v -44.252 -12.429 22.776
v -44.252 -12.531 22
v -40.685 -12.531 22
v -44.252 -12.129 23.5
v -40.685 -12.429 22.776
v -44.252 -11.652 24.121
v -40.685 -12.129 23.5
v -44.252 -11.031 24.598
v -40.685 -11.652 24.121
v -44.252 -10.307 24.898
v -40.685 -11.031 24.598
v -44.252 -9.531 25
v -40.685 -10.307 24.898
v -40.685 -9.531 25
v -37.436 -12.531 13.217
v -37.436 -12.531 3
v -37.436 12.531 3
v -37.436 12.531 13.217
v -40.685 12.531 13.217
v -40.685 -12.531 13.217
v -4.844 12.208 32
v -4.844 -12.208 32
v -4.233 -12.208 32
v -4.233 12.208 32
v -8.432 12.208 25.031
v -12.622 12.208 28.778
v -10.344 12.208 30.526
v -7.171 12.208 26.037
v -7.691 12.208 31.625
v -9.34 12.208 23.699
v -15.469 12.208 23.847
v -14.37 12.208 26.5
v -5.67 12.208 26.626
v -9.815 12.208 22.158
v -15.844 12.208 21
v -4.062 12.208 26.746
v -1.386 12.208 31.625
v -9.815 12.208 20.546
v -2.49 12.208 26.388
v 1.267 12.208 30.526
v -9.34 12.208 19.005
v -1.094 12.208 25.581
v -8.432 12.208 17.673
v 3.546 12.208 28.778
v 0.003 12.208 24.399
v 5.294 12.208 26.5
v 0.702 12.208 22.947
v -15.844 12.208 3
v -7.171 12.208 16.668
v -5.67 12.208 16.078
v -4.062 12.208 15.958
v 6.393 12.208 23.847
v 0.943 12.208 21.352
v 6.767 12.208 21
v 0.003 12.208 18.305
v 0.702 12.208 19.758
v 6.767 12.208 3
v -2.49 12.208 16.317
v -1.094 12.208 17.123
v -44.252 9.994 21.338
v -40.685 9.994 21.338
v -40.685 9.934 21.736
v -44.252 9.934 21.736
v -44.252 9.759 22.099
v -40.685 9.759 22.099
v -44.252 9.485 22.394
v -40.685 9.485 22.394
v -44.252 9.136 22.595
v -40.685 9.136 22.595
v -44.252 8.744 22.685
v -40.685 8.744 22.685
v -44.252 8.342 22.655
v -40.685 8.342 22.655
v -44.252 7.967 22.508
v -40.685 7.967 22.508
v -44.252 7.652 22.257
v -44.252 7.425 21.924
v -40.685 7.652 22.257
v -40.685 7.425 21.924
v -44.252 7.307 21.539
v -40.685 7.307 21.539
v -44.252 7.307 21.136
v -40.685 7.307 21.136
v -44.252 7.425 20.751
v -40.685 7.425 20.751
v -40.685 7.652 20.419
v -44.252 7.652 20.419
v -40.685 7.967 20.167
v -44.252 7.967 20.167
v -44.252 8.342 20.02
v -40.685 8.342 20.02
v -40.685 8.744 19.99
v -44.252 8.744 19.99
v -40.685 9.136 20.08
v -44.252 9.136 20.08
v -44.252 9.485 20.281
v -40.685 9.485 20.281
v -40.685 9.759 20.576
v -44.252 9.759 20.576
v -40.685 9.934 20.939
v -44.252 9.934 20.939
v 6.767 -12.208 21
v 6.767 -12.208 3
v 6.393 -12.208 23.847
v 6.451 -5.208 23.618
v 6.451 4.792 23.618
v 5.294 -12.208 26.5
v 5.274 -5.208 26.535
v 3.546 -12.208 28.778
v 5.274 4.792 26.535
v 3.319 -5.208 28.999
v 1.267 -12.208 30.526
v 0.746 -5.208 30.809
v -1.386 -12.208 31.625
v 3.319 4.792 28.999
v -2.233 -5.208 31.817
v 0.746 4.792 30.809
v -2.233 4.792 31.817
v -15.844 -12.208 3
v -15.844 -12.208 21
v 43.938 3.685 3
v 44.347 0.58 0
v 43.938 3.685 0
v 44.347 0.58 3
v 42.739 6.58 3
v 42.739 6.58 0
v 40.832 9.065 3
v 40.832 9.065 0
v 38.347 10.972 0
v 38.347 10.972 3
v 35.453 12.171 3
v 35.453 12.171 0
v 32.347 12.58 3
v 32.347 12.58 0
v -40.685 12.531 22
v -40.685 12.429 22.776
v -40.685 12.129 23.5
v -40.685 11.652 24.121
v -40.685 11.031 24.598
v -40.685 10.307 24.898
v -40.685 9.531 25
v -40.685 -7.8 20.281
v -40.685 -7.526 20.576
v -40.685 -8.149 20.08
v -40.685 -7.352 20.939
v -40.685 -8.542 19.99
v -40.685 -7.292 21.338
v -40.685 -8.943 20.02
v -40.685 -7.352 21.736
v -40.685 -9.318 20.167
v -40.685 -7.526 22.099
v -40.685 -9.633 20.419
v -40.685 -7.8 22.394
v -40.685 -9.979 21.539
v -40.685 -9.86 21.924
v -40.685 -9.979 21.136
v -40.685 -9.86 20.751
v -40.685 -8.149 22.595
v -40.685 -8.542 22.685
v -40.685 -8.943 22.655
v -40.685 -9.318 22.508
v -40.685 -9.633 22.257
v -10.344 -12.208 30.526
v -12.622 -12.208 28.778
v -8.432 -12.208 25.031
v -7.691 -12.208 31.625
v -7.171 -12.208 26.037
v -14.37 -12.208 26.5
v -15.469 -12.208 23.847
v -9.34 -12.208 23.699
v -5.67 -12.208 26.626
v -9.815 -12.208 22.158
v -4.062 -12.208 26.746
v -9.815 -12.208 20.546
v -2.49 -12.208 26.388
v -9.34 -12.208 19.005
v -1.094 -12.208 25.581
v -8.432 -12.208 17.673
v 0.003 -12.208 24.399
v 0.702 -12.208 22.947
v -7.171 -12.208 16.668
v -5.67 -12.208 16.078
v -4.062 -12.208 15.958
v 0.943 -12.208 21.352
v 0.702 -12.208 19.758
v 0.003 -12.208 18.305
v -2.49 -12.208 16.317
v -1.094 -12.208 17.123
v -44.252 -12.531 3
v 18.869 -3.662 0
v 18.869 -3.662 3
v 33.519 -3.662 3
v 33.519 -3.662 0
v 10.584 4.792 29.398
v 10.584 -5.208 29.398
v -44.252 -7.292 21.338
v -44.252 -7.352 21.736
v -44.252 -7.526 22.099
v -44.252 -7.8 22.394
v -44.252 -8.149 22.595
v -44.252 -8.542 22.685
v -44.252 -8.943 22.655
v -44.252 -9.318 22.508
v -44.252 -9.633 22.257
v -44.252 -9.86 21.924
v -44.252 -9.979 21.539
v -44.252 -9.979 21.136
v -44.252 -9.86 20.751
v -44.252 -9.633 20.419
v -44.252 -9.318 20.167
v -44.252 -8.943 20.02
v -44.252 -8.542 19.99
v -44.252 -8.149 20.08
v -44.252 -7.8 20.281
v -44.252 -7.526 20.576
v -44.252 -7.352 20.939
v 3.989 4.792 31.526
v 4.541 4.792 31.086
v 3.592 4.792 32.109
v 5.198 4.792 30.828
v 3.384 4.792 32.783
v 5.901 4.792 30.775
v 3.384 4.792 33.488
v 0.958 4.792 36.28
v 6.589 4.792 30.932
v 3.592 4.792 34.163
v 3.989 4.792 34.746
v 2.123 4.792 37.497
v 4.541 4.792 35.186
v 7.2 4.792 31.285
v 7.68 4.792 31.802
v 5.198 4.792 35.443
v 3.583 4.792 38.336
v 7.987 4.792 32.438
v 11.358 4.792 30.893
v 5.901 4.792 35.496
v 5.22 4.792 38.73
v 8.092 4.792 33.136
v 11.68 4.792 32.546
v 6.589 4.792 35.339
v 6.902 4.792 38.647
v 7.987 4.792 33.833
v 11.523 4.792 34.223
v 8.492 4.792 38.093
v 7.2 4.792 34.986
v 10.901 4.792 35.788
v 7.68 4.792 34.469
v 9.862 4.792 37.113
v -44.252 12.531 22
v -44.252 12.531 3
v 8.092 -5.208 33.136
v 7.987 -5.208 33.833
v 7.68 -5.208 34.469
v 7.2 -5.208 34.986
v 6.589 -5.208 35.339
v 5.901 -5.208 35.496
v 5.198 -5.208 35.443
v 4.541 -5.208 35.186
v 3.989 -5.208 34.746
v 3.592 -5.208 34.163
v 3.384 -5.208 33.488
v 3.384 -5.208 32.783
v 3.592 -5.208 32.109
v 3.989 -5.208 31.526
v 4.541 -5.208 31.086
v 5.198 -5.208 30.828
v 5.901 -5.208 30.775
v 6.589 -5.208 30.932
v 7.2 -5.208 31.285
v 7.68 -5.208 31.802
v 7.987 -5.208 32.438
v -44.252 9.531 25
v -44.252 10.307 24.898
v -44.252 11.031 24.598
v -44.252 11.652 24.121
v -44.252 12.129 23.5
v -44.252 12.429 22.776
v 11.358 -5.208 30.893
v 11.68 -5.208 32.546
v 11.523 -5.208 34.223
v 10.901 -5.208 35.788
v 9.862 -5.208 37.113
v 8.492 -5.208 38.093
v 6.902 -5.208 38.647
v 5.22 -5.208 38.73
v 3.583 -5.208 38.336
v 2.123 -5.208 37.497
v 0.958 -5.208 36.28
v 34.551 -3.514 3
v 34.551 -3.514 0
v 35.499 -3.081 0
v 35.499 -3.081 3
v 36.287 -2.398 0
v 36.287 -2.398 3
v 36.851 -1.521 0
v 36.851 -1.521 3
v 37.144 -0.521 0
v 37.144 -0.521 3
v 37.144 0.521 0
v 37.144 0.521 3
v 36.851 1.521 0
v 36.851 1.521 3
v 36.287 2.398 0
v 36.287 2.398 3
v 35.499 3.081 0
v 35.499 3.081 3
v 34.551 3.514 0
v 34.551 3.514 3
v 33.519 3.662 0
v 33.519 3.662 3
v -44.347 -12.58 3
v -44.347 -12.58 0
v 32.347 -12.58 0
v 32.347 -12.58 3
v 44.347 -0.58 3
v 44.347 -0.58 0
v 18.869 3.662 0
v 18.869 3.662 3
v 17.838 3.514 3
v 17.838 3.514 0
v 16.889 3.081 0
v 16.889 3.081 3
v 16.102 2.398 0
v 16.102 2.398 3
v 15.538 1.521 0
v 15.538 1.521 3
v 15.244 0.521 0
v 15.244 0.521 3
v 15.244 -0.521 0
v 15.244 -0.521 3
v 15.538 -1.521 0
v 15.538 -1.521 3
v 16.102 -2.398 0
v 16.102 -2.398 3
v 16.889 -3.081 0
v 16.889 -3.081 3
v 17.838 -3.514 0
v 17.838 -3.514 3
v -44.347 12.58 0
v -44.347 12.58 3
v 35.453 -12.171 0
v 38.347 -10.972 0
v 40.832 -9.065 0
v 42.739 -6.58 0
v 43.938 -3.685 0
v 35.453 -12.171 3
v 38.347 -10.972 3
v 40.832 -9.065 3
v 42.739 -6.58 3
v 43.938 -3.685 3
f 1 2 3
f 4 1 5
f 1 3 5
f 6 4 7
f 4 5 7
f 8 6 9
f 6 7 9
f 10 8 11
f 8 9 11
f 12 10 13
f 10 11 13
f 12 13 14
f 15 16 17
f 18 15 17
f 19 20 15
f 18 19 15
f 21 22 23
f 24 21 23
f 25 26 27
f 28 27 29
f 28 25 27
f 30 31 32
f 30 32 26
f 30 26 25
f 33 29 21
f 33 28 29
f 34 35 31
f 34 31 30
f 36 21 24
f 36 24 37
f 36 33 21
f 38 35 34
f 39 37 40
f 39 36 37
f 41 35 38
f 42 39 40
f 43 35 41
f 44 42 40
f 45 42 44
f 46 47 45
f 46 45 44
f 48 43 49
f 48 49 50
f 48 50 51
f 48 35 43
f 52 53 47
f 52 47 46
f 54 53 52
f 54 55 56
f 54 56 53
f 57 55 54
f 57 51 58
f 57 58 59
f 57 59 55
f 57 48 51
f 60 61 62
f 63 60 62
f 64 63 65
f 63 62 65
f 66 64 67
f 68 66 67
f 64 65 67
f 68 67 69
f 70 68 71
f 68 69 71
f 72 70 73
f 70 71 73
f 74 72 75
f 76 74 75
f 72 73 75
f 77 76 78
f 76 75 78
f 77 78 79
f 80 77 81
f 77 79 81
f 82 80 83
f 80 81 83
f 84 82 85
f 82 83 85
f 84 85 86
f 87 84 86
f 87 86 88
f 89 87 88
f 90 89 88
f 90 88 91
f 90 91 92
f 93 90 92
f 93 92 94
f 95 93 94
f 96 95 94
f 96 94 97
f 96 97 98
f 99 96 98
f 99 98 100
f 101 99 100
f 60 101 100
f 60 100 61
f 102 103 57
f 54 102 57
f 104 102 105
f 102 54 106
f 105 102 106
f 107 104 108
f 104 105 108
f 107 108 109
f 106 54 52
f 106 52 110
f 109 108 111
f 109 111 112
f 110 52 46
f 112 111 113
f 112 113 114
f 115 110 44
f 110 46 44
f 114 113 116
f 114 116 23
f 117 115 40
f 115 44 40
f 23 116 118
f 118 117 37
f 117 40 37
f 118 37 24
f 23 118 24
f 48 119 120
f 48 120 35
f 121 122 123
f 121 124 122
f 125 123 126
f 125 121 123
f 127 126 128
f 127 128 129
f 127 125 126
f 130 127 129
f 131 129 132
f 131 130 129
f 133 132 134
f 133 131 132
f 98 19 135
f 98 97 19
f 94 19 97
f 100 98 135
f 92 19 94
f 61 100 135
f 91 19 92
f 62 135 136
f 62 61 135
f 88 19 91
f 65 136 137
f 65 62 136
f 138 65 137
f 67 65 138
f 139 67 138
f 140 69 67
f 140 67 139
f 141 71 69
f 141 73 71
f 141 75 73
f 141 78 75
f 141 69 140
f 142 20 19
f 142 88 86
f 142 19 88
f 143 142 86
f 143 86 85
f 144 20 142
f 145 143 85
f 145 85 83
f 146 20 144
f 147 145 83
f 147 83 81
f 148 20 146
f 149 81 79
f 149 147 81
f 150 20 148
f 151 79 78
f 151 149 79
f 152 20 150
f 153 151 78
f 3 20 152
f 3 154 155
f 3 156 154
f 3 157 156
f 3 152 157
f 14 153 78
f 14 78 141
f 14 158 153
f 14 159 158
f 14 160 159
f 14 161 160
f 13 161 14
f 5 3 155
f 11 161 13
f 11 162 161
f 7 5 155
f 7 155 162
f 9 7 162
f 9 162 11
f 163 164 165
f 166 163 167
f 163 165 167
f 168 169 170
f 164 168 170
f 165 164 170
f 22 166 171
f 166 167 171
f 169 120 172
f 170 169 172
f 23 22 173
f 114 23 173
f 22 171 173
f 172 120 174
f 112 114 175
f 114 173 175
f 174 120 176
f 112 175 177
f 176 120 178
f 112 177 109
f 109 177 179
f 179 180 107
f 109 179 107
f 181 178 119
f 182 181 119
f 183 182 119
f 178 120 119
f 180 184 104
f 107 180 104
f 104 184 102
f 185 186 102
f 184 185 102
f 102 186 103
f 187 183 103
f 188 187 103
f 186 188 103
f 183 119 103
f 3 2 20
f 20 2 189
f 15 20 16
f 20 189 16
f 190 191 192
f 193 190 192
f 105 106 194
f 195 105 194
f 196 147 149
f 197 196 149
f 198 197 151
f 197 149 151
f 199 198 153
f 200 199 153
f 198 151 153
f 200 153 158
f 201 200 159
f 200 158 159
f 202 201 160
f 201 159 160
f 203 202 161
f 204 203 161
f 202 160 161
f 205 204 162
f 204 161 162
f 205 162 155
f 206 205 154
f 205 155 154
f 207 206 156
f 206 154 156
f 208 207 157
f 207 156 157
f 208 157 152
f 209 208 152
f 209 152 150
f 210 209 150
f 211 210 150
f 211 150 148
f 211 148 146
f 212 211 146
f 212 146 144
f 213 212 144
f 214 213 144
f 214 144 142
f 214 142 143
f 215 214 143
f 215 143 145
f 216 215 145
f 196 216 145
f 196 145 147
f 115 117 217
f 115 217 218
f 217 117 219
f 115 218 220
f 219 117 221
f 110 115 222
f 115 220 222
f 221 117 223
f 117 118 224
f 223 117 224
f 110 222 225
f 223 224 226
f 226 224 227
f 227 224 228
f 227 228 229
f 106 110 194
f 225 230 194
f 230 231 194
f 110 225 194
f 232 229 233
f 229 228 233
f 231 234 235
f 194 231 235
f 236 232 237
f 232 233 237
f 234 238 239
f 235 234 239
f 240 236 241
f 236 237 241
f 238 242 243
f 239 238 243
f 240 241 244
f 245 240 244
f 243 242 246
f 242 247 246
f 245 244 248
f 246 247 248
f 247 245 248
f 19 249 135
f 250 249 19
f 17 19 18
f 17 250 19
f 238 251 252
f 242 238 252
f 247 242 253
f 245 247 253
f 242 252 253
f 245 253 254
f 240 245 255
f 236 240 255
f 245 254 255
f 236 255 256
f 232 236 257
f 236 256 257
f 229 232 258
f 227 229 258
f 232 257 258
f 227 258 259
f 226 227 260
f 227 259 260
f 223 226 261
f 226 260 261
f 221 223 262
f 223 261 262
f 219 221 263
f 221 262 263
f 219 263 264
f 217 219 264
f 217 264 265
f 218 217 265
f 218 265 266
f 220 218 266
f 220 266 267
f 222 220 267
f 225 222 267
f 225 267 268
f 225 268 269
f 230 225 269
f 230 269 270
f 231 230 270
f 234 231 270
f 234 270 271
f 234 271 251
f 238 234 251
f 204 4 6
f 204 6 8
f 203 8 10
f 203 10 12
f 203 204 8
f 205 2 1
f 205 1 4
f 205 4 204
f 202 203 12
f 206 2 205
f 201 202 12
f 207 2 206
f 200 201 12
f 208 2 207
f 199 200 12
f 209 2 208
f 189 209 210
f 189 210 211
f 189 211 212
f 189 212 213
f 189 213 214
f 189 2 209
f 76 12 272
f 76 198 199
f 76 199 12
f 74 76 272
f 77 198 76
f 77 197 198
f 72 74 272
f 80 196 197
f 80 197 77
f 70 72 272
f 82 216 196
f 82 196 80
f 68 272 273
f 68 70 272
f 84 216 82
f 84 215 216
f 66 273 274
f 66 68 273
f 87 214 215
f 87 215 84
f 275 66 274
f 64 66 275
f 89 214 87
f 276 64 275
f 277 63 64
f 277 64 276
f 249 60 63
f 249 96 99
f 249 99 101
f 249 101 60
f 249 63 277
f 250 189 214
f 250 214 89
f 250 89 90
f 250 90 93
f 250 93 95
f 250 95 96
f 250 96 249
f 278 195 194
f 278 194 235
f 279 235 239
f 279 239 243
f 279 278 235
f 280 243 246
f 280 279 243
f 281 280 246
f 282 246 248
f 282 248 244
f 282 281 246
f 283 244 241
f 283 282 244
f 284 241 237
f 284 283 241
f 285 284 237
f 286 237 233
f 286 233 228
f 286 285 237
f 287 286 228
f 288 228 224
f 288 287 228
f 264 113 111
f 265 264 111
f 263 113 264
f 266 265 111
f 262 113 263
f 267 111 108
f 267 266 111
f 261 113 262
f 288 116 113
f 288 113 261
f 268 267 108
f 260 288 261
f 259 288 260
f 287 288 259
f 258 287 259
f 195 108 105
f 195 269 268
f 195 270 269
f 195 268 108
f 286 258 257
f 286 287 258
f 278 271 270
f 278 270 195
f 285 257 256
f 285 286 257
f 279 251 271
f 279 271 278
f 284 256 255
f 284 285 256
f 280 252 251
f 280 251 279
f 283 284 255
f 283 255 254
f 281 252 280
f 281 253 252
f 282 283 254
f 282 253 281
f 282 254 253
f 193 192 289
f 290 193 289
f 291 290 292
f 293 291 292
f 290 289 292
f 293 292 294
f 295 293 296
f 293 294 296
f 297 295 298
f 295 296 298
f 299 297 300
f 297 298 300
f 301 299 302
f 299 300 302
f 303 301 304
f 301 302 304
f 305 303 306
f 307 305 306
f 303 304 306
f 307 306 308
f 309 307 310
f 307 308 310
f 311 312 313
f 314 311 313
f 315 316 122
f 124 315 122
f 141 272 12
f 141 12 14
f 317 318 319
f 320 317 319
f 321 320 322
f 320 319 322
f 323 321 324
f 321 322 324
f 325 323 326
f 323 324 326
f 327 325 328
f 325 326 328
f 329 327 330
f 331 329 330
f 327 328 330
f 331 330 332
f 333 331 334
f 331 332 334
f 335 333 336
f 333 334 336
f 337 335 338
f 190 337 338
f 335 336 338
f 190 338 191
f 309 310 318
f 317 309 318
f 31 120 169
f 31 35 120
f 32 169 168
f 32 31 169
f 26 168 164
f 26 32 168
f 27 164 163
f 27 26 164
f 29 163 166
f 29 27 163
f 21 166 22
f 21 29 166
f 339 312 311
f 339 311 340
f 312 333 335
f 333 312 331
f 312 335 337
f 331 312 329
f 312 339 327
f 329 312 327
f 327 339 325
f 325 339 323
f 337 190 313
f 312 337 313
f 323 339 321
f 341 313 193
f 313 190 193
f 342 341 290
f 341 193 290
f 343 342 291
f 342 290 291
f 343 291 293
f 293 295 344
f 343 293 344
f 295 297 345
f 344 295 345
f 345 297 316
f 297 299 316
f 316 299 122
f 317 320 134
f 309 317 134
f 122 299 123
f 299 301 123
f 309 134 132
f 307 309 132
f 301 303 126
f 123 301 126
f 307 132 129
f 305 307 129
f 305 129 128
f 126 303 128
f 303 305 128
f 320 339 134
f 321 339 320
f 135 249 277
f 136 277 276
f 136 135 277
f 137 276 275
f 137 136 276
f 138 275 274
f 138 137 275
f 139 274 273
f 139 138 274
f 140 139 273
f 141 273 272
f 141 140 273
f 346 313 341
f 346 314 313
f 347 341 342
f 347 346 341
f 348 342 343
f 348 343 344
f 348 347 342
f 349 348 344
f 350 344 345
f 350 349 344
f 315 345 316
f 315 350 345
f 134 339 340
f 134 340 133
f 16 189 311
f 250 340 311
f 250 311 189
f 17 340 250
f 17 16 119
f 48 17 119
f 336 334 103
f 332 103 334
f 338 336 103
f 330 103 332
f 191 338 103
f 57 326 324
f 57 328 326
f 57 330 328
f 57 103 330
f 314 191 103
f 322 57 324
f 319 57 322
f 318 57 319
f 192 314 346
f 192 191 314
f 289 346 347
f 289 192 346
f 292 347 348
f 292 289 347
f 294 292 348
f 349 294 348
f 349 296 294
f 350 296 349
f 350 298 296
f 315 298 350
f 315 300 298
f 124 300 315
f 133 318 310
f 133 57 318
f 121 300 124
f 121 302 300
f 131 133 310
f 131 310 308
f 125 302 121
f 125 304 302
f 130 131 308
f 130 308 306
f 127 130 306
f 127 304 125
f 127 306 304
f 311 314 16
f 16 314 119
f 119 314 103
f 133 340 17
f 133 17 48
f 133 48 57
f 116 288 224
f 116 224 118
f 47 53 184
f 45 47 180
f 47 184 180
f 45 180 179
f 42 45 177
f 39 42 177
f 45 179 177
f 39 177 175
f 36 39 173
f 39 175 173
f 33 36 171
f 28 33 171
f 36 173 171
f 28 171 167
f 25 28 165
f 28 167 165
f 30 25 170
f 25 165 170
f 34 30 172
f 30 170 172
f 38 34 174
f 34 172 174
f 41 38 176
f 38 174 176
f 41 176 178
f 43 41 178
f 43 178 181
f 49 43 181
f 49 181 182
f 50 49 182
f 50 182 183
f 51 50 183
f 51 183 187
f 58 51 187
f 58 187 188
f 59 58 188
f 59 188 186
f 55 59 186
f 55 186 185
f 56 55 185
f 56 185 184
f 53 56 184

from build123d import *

# Parameters (mm, degrees)
SKETCH_W        = 88.694274
SKETCH_H        = 25.15924
PAD_DEPTH       = 3
FILLET_R        = 12
POCKET_DEPTH    = 5
SKETCH002_W     = 6.815415
SKETCH002_H     = 25.06178
PAD001_DEPTH    = 22
FILLET001_R     = 3
SKETCH003_W     = 6.847126
SKETCH003_H     = 18.152864
POCKET001_DEPTH = 25.11151
SKETCH004_R     = 1.351161
POCKET002_DEPTH = 14
SKETCH005_W     = 22.611487
SKETCH005_H     = 24.415462
PAD002_DEPTH    = 29
FILLET002_R     = 11
PAD003_DEPTH    = 5
SKETCH007_R     = 2.367202
POCKET003_DEPTH = 17.788351
SKETCH008_R     = 5.409327
POCKET004_DEPTH = 24.788351


with BuildPart() as part:
    # Sketch → Pad (new body)
    with BuildSketch(Plane.XY):
        Rectangle(SKETCH_W, SKETCH_H)
    extrude(amount=PAD_DEPTH)

    # Fillet
    fillet_edges = [part.edges().sort_by_distance(p)[0] for p in [
        (44.347137, -12.57962, 1.5),
        (44.347137, 12.57962, 1.5),
    ]]
    fillet(fillet_edges, radius=FILLET_R)

    # Sketch001 (on Face5 of Fillet) → Pocket (cut)
    with BuildSketch(Plane.XY.offset(3)):
        with BuildLine():
            ThreePointArc((18.869435, 3.66242), (15.207015, 0), (18.869435, -3.66242))
            Line((18.869435, -3.66242), (33.519115, -3.66242))
            ThreePointArc((33.519115, -3.66242), (37.181535, 0), (33.519115, 3.66242))
            Line((33.519115, 3.66242), (18.869435, 3.66242))
        make_face()
    extrude(amount=-POCKET_DEPTH, mode=Mode.SUBTRACT)

    # Sketch002 (on Face5 of Pocket) → Pad001 (join)
    with BuildSketch(Plane.XY.offset(3)):
        with Locations((-40.843948, 0)):
            Rectangle(SKETCH002_W, SKETCH002_H)
    extrude(amount=PAD001_DEPTH)

    # Fillet001
    fillet001_edges = [part.edges().sort_by_distance(p)[0] for p in [
        (-40.843949, -12.53089, 25),
        (-40.843948, 12.53089, 25),
    ]]
    fillet(fillet001_edges, radius=FILLET001_R)

    # Sketch003 (on Face2 of Fillet001) → Pocket001 (cut, through all)
    with BuildSketch(Plane.XZ.offset(12.53089)):
        with Locations((-37.261145, 22.292999)):
            Rectangle(SKETCH003_W, SKETCH003_H)
    extrude(amount=-POCKET001_DEPTH, mode=Mode.SUBTRACT)

    # Sketch004 (on Face18 of Pocket001) → Pocket002 (cut)
    with BuildSketch(Plane.YZ.offset(-40.684708)):
        with Locations((-8.64271, 21.337582)):
            Circle(SKETCH004_R)
        with Locations((8.64271, 21.337582)):
            Circle(SKETCH004_R)
    extrude(amount=-POCKET002_DEPTH, mode=Mode.SUBTRACT)

    # Sketch005 (on Face2 of Pocket002) → Pad002 (join)
    with BuildSketch(Plane.XY.offset(3)):
        with Locations((-4.538261, 0)):
            Rectangle(SKETCH005_W, SKETCH005_H)
    extrude(amount=PAD002_DEPTH)

    # Fillet002
    fillet002_edges = [part.edges().sort_by_distance(p)[0] for p in [
        (6.767482, 0, 32),
        (-15.844005, 0, 32),
    ]]
    fillet(fillet002_edges, radius=FILLET002_R)

    # Sketch006 (on Face1 of Fillet002) → Pad003 (join, symmetric)
    with BuildSketch(Plane.XZ.offset(0.207731)):
        with BuildLine():
            ThreePointArc((-10.734413, 19.926899), (-9.362729, 11.672937), (-1.108767, 13.044622))
            Line((-1.108767, 13.044622), (10.583898, 29.398141))
            ThreePointArc((10.583898, 29.398141), (9.212214, 37.652103), (0.958252, 36.280419))
            Line((0.958252, 36.280419), (-10.734413, 19.926899))
        make_face()
    extrude(amount=PAD003_DEPTH, both=True)

    # Sketch007 (on Face11 of Pad003) → Pocket003 (cut, through all)
    with BuildSketch(Plane.XZ.offset(5.207731)):
        with Locations((5.724531, 33.13562)):
            Circle(SKETCH007_R)
    extrude(amount=-POCKET003_DEPTH, mode=Mode.SUBTRACT)

    # Sketch008 (on Face1 of Pocket003) → Pocket004 (cut, through all)
    with BuildSketch(Plane.XZ.offset(12.207731)):
        with Locations((-4.466556, 21.352194)):
            Circle(SKETCH008_R)
    extrude(amount=-POCKET004_DEPTH, mode=Mode.SUBTRACT)


solid = part.part
